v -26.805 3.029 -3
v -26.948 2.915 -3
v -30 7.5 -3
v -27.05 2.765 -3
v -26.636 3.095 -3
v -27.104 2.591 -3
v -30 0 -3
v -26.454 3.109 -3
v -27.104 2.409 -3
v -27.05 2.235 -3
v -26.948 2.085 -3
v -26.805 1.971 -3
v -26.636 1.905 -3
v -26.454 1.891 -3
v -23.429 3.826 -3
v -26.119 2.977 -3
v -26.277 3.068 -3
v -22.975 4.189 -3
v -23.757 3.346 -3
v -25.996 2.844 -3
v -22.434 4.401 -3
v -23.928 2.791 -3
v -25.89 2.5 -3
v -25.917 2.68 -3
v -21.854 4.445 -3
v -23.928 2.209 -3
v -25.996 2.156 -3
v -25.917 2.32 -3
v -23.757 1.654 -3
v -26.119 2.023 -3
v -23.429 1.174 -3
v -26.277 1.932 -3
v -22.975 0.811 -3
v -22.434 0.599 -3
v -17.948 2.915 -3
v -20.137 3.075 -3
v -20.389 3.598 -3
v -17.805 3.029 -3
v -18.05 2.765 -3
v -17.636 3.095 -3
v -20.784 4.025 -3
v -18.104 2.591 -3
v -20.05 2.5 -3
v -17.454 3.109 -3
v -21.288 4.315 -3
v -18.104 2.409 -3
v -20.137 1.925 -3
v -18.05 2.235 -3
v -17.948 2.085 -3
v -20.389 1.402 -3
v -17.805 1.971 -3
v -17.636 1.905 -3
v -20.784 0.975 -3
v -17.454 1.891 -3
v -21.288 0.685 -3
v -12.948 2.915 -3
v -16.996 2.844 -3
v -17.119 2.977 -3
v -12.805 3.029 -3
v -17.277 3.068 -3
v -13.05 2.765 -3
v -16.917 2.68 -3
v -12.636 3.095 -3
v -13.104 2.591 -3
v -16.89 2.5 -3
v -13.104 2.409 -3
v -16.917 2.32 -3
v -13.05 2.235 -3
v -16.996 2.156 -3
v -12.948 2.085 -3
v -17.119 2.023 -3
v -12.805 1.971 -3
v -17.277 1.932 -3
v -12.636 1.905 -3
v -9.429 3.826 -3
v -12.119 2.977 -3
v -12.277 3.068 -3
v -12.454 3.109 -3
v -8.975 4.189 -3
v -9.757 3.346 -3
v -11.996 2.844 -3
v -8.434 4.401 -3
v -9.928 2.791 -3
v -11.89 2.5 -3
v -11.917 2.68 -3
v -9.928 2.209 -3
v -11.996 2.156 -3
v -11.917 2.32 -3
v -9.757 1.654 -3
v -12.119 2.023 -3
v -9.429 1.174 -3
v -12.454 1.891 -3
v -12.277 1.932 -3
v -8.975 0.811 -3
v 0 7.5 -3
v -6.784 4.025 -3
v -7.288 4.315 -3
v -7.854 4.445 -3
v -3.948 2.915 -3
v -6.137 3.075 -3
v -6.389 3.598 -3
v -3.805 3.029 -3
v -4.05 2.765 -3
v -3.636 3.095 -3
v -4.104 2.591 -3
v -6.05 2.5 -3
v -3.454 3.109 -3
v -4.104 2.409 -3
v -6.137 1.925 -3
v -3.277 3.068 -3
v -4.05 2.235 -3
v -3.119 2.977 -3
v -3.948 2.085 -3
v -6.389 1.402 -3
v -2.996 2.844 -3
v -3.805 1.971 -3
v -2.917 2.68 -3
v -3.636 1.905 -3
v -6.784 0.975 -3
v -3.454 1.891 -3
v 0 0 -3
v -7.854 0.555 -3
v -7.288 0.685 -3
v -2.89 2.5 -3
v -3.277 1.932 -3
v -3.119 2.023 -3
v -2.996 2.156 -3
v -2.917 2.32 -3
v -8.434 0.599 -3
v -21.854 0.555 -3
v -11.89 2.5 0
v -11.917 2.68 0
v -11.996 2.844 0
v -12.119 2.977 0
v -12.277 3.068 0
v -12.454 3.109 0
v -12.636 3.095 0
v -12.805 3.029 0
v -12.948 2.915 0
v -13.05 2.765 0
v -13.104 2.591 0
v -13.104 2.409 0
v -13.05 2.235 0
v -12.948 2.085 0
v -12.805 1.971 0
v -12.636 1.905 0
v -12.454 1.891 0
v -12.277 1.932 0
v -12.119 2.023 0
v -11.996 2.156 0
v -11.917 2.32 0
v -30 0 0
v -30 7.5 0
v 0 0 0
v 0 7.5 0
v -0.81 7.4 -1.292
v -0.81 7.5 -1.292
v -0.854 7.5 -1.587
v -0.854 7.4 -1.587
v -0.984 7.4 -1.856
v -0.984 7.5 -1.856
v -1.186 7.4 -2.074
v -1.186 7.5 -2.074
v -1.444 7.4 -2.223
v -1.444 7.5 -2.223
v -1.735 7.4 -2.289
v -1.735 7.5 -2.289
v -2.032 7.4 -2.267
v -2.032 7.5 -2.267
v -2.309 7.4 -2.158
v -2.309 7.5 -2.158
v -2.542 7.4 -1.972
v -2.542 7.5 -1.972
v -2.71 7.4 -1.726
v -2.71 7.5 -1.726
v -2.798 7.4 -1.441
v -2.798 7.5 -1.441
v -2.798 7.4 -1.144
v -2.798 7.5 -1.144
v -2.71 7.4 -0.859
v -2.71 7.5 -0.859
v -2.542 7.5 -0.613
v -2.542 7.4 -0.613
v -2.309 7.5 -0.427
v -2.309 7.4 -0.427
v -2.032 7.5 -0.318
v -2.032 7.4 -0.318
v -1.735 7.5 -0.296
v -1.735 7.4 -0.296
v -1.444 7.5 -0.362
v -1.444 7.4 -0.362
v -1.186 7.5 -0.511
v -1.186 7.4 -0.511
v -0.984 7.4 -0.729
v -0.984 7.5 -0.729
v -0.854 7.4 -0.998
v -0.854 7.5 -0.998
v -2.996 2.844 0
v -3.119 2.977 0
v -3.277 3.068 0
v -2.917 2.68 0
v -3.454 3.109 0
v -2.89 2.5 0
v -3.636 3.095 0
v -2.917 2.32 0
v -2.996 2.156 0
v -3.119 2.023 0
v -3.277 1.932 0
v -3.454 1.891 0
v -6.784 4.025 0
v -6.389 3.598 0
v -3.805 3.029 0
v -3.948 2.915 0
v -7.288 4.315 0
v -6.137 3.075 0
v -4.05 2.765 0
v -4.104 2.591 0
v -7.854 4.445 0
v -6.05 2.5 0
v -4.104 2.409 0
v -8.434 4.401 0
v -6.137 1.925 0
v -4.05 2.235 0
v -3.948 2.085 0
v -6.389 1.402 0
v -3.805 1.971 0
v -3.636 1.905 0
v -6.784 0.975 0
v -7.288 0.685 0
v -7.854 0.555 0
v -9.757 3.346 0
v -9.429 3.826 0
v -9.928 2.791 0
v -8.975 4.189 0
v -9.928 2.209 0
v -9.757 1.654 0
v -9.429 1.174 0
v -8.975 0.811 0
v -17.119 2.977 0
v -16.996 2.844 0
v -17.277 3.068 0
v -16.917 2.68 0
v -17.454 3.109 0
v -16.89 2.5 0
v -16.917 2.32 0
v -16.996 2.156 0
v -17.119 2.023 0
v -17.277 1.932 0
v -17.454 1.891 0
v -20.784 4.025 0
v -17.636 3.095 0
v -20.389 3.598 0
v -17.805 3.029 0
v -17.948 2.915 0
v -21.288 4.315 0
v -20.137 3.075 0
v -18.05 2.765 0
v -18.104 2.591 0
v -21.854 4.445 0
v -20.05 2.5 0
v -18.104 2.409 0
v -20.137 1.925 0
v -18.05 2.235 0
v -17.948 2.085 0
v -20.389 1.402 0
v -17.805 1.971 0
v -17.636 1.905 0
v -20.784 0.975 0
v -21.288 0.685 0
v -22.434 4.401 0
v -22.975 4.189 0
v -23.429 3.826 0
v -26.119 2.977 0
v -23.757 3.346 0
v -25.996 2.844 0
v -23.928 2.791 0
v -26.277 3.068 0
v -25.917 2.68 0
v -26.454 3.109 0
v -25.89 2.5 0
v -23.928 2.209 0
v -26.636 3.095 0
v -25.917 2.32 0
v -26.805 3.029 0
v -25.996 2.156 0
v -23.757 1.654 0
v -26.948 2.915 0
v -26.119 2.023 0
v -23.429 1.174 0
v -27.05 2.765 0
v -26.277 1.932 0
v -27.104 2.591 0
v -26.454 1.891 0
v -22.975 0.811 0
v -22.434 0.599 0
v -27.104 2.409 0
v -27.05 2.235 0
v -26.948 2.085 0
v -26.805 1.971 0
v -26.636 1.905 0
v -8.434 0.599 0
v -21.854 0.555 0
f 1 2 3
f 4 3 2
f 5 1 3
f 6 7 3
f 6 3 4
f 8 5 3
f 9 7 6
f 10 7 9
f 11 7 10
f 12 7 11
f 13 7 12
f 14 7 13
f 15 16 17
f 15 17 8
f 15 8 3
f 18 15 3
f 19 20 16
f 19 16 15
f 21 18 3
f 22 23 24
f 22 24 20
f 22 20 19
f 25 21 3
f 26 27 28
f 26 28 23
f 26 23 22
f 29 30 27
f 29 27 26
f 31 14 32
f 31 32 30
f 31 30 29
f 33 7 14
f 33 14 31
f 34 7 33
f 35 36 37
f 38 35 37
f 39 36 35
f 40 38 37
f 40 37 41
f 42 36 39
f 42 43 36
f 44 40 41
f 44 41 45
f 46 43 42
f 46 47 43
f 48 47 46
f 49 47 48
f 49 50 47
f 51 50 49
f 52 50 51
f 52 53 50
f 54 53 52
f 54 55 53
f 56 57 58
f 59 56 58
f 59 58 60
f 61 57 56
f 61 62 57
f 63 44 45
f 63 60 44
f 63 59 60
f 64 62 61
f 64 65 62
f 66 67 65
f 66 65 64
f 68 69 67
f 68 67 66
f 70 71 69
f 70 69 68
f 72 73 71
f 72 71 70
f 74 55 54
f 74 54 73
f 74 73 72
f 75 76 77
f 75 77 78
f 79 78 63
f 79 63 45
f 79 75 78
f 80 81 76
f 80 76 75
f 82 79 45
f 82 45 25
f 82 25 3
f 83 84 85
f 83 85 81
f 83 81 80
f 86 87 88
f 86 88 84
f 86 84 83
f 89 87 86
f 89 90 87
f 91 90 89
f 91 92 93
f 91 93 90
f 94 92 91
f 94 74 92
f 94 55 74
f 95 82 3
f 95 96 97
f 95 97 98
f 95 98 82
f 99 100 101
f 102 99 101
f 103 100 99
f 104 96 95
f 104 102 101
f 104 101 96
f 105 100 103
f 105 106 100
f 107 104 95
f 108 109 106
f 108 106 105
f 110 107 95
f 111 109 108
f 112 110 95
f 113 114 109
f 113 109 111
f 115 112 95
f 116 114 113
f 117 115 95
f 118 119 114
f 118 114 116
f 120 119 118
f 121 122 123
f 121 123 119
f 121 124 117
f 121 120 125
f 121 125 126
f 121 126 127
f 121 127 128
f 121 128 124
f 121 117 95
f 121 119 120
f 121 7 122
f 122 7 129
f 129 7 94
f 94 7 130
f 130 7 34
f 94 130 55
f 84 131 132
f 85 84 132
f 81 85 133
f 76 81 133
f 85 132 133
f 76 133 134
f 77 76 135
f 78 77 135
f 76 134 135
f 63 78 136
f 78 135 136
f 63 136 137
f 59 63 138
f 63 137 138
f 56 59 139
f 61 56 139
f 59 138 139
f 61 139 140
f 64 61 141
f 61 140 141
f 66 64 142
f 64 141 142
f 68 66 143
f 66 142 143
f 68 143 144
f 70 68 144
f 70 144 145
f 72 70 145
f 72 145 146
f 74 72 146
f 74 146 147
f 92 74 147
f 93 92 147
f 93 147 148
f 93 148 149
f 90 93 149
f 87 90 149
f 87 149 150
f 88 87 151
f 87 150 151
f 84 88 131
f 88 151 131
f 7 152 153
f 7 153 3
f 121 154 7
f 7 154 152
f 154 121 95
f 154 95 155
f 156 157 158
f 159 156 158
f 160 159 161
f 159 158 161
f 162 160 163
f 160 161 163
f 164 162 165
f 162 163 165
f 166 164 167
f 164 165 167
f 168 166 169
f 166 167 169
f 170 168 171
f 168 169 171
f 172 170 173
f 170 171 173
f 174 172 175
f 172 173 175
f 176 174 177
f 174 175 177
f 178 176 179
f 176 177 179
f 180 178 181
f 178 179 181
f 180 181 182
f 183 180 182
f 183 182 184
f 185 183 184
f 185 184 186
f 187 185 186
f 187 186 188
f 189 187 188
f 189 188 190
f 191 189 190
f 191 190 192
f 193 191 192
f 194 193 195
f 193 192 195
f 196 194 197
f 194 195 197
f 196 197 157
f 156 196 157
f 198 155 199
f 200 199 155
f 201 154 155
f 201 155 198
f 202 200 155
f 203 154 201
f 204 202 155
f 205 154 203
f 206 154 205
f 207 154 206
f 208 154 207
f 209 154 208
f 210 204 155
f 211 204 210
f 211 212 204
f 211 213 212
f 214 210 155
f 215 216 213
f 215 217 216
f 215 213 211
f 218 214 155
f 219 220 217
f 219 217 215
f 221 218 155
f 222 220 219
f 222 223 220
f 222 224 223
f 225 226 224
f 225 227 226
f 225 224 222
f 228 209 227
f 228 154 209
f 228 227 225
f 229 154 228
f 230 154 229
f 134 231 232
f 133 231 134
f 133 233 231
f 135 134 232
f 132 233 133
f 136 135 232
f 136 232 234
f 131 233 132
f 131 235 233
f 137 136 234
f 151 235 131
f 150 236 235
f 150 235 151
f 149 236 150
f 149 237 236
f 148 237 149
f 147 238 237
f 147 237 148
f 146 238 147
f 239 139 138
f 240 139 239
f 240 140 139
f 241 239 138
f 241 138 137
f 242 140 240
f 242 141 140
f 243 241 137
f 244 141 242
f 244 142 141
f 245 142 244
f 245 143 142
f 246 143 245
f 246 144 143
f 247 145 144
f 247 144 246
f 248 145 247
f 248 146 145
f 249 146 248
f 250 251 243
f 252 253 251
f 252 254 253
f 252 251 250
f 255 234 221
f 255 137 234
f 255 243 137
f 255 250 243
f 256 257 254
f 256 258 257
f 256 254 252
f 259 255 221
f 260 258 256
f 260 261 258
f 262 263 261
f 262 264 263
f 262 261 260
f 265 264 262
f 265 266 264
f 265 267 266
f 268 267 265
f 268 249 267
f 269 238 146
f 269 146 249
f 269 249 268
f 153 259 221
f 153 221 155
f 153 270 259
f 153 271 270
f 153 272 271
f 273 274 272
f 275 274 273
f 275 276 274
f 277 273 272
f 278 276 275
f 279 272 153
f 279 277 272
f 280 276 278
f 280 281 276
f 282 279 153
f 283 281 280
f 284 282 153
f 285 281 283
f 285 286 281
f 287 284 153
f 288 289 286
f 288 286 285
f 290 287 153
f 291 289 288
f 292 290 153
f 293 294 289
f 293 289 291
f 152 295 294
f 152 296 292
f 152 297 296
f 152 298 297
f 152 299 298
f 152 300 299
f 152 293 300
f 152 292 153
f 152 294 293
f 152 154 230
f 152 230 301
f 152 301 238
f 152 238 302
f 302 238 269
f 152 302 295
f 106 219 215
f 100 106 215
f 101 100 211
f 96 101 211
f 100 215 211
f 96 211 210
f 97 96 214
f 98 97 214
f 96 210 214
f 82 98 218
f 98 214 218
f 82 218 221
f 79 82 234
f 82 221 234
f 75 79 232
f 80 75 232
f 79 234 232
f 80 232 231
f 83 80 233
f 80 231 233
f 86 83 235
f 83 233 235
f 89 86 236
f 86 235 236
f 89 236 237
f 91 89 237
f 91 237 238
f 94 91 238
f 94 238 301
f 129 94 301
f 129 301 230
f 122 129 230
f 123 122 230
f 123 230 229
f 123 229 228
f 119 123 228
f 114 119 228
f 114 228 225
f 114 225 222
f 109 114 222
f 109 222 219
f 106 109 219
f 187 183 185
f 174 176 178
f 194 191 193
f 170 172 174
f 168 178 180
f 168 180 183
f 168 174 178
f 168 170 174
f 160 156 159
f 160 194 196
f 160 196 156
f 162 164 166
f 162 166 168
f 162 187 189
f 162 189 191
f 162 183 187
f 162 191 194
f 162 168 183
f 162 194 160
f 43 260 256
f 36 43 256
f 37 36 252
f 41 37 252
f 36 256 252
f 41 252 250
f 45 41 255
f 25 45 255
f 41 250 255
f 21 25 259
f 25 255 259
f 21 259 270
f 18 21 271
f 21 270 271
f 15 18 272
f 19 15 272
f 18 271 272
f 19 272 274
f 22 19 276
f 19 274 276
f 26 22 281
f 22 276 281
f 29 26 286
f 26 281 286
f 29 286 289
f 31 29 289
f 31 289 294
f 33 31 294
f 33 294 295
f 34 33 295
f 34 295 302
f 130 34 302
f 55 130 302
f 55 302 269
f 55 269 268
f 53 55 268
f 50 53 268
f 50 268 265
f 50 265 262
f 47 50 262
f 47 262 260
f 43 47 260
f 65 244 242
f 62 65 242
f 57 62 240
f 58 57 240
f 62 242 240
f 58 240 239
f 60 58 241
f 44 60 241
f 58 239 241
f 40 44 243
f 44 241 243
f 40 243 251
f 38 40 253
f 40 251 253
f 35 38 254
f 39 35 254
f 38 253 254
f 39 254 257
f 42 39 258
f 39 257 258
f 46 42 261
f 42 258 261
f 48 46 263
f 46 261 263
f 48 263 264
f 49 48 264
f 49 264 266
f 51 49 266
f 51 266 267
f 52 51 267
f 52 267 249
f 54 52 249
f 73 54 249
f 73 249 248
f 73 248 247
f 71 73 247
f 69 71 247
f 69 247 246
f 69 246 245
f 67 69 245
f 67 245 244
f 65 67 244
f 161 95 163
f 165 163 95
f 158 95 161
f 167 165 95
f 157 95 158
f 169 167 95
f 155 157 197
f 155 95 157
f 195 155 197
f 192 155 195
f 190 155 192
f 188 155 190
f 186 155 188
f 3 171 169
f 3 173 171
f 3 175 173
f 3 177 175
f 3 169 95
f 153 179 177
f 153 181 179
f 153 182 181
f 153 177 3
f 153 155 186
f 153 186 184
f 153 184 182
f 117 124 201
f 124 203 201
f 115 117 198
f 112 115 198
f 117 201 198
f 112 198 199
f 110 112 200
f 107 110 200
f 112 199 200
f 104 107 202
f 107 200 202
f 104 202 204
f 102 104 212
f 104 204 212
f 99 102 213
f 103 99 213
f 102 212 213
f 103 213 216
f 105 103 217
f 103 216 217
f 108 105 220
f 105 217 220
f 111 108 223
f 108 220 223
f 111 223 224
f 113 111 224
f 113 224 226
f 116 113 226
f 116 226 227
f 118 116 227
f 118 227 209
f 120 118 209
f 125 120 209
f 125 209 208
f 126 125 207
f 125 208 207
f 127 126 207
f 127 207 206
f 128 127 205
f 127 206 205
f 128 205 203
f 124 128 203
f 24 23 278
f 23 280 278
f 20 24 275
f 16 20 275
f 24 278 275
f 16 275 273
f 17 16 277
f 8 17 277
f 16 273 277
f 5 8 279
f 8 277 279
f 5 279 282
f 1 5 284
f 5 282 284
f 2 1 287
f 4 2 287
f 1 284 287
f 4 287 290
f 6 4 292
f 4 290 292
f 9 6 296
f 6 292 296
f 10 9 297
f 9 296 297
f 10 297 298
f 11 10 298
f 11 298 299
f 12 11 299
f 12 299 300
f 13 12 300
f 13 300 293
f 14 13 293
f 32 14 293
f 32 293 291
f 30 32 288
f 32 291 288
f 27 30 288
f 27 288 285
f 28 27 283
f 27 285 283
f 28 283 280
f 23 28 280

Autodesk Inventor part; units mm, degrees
ref_plane "YZ Plane" through (0, 0, 0) normal (1, 0, 0) x (0, 1, 0)
ref_plane "XZ Plane" through (0, 0, 0) normal (0, 1, 0) x (-1, 0, 0)
ref_plane "XY Plane" through (0, 0, 0) normal (0, 0, 1) x (1, 0, 0)
sketch "Sketch1" plane through (0, 0, 0) normal (0, 1, 0) x (-1, 0, 0)
  line L0 (0, 0) -> (30, 0)
  line L1 (30, 0) -> (30, -3)
  line L2 (30, -3) -> (0, -3)
  line L3 (0, -3) -> (0, 0)
  dimension "d0" = 30
  dimension "d1" = 3
extrude "Extrusion1" add sketch "Sketch1" along normal blind 7.5
sketch "Sketch2" plane through (0, 7.5, 0) normal (0, 1, 0) x (1, 0, 0)
  circle A0 centre (-1.8095, 1.2925) radius 0.9997
  point P0 (0, 0)
extrude "Extrusion2" cut sketch "Sketch2" against normal blind 0.1
sketch "Sketch3" plane through (-30, 0, 0) normal (0, 0, 1) x (1, 0, 0)
  circle A0 centre (26.5, 2.5) radius 0.6105
  circle A1 centre (22, 2.5) radius 1.95
  circle A2 centre (17.5, 2.5) radius 0.6105
  line L0 (0, 0) -> (30, 0) projected
  line L1 (30, 0) -> (30, 7.5) projected
  line L2 (0, 7.5) -> (30, 7.5) projected
  line L3 (0, 7.5) -> (30, 7.5)
  line L4 (30, 7.5) -> (15, 7.5)
  line L5 (15, 0) -> (15, 7.5)
  circle A3 centre (3.5, 2.5) radius 0.6105
  circle A4 centre (8, 2.5) radius 1.95
  circle A5 centre (12.5, 2.5) radius 0.6105
  dimension "d6" = 1.221
  dimension "d7" = 3.9
  dimension "d8" = 1.221
  dimension "d9" = 2.5
  dimension "d10" = 2.5
  dimension "d11" = 2.5
  dimension "d12" = 3.5
  dimension "d13" = 8
  dimension "d14" = 4.5
extrude "Extrusion3" cut sketch "Sketch3" against normal blind 3 contours A0 | A1 | A2 | A3 | A4 | A5
properties part number "backmidmotorwall"
